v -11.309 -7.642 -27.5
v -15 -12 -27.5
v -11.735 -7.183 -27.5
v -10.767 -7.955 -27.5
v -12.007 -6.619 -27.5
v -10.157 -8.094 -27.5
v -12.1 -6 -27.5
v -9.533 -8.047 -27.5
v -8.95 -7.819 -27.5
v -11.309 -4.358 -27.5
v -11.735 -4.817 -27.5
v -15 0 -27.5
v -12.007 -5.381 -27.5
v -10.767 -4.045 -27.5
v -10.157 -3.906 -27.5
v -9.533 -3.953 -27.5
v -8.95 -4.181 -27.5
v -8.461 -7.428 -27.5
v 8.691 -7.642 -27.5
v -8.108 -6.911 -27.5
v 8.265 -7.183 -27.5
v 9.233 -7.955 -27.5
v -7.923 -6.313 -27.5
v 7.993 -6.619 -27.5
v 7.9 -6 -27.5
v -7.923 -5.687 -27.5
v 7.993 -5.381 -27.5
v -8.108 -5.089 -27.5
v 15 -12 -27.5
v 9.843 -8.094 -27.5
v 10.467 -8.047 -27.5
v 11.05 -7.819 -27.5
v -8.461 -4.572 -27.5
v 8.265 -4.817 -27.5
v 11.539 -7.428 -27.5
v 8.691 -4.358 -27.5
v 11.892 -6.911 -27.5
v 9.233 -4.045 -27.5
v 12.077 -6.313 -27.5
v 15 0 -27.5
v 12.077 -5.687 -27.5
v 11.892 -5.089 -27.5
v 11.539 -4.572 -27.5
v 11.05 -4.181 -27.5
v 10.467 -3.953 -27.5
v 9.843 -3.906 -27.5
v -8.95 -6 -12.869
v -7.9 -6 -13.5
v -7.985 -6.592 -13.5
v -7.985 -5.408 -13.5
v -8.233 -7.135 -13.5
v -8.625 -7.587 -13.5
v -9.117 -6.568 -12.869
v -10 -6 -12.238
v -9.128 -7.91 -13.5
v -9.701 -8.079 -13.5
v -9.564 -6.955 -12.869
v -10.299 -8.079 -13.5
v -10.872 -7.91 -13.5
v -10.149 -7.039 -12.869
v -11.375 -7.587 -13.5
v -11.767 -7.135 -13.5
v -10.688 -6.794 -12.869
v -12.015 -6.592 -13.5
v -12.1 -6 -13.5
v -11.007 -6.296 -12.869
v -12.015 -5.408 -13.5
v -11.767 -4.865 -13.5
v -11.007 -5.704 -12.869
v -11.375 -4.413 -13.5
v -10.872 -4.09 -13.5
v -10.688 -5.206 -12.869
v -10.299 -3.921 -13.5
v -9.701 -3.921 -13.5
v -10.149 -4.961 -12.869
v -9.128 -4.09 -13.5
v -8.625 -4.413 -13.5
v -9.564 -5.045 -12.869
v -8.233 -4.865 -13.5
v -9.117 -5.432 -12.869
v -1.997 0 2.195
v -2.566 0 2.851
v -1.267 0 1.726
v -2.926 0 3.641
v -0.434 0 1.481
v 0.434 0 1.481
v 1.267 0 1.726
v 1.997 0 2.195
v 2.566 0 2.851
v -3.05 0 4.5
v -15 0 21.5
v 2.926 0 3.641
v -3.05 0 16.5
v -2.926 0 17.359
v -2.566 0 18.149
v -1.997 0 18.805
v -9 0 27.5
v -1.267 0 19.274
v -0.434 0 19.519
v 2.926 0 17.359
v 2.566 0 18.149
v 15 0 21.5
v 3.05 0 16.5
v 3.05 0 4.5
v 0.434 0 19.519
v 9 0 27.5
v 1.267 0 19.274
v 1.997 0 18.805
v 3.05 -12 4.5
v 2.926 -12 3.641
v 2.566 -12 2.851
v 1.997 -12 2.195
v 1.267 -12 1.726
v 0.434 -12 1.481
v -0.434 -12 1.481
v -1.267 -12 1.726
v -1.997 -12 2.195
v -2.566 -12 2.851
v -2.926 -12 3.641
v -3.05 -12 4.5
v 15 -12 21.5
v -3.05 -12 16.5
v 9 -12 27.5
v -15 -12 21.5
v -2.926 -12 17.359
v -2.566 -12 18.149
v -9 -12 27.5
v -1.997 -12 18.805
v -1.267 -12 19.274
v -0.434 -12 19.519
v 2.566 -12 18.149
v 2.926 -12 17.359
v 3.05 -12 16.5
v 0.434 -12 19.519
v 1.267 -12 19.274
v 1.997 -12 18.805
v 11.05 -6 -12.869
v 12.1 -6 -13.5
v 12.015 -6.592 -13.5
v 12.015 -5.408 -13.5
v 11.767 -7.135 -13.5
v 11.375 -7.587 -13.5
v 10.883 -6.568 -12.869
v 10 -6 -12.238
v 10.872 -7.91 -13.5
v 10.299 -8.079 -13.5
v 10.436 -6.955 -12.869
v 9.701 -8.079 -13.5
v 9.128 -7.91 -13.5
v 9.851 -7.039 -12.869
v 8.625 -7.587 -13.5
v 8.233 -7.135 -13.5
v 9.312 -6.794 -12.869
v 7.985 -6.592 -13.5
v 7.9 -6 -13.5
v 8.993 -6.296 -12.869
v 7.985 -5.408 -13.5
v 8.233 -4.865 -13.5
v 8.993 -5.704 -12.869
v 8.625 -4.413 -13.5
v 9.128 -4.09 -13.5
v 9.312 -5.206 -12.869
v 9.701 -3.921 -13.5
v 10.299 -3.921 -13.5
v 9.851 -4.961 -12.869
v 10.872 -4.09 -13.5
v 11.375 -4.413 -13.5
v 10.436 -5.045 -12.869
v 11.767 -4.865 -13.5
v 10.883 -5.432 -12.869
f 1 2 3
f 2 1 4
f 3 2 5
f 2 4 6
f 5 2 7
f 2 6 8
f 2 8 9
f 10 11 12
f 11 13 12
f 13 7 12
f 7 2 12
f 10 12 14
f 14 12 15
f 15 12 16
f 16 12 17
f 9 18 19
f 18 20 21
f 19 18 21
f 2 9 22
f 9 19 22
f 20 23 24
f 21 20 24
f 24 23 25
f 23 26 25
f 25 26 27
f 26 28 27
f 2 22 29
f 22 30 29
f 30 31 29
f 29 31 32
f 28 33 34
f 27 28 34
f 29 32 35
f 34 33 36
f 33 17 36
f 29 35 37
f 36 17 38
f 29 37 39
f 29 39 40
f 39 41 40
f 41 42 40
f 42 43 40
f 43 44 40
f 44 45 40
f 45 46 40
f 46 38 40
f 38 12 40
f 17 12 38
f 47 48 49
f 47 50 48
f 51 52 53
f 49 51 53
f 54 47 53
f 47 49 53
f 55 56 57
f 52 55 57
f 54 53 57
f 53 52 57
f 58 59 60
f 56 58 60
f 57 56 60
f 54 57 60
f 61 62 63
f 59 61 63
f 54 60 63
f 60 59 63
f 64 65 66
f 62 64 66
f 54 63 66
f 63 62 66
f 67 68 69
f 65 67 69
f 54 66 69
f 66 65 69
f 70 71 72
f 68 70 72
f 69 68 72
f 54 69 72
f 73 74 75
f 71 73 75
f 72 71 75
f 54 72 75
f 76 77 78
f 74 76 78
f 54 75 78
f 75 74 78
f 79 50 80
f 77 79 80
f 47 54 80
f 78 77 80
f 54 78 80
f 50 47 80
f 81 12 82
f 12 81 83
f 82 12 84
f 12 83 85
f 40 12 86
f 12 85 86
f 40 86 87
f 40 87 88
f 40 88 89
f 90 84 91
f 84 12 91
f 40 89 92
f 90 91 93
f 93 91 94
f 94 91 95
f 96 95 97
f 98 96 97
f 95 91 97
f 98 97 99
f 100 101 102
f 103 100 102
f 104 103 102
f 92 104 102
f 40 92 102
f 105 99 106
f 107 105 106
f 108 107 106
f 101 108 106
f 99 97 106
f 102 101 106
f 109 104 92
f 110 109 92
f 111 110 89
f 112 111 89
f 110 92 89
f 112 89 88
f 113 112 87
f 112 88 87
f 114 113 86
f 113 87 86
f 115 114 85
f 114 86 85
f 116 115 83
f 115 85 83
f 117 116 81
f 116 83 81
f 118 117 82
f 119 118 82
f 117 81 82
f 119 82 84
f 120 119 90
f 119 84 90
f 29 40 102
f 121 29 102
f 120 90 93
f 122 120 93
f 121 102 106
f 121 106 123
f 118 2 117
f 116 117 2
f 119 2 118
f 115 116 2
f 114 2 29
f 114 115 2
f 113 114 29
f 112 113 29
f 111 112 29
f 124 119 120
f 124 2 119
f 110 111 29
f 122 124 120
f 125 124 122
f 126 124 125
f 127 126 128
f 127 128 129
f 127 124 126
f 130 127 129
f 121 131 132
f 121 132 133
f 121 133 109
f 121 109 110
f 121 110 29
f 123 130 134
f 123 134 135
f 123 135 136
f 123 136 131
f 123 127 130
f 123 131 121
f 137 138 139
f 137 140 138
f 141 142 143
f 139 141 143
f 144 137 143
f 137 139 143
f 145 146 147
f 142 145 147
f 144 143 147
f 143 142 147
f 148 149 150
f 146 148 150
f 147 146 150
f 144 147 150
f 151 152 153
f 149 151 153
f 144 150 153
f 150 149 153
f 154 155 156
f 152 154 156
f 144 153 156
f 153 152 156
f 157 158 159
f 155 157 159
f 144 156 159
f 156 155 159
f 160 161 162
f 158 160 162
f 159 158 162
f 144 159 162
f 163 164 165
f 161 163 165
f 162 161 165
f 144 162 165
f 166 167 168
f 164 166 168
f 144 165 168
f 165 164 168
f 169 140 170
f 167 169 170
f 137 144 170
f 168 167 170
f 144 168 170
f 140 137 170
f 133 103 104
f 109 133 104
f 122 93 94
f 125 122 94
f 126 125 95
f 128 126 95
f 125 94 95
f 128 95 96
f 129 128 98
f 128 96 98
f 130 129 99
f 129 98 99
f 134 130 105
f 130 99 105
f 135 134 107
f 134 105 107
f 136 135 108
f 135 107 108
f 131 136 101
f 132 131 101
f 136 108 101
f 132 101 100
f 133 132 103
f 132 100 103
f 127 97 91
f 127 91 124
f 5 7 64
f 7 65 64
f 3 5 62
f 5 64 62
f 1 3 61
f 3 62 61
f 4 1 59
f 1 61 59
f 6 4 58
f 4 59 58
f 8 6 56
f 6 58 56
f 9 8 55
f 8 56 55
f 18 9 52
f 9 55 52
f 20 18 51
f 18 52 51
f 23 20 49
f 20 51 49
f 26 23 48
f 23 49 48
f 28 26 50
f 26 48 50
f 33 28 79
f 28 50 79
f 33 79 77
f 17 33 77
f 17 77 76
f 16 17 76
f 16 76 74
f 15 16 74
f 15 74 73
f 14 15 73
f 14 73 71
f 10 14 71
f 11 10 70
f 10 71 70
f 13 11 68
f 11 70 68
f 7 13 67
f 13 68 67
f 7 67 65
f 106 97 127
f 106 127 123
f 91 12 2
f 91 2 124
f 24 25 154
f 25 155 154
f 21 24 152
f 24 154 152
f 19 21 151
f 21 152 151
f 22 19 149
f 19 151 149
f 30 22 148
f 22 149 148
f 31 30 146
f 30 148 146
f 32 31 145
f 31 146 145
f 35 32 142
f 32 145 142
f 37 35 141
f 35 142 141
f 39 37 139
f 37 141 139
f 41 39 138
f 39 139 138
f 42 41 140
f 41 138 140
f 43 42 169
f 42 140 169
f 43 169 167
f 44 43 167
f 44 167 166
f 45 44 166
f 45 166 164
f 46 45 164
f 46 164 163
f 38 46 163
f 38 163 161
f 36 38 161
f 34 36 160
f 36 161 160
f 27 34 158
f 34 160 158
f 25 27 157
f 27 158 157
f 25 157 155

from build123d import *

# Parameters (mm, degrees)
F0_W     = 30
F0_H     = 55
F1_DEPTH = 12
F2_SIZE  = 6
F4_D     = 4.2
F4_DEPTH = 14
F4_TIP   = 1.2618073


with BuildPart() as f1:
    # F0 (on Front) → F1 (new body)
    with BuildSketch(Plane.XZ):
        Rectangle(F0_W, F0_H)
        with BuildLine():
            ThreePointArc((-3.05, 16.5), (0, 19.55), (3.05, 16.5))
            Line((3.05, 16.5), (3.05, 4.5))
            ThreePointArc((3.05, 4.5), (0, 1.45), (-3.05, 4.5))
            Line((-3.05, 4.5), (-3.05, 16.5))
        make_face(mode=Mode.SUBTRACT)
    extrude(amount=F1_DEPTH)

    # F2
    f2_edges = [f1.edges().sort_by_distance(p)[0] for p in [
        (-15, -6, 27.5),
        (15, -6, 27.5),
    ]]
    chamfer(f2_edges, length=F2_SIZE)

    # F4
    with Locations(Plane(origin=(0, 0, -27.5), x_dir=(1, 0, 0), z_dir=(0, 0, -1))):
        with Locations((-10, 6), (10, 6)):
            Hole(F4_D / 2, depth=F4_DEPTH)
            with Locations((0, 0, -(F4_DEPTH + F4_TIP / 2))):  # 118° drill point
                Cone(0, F4_D / 2, F4_TIP, mode=Mode.SUBTRACT)


solid = f1.part
